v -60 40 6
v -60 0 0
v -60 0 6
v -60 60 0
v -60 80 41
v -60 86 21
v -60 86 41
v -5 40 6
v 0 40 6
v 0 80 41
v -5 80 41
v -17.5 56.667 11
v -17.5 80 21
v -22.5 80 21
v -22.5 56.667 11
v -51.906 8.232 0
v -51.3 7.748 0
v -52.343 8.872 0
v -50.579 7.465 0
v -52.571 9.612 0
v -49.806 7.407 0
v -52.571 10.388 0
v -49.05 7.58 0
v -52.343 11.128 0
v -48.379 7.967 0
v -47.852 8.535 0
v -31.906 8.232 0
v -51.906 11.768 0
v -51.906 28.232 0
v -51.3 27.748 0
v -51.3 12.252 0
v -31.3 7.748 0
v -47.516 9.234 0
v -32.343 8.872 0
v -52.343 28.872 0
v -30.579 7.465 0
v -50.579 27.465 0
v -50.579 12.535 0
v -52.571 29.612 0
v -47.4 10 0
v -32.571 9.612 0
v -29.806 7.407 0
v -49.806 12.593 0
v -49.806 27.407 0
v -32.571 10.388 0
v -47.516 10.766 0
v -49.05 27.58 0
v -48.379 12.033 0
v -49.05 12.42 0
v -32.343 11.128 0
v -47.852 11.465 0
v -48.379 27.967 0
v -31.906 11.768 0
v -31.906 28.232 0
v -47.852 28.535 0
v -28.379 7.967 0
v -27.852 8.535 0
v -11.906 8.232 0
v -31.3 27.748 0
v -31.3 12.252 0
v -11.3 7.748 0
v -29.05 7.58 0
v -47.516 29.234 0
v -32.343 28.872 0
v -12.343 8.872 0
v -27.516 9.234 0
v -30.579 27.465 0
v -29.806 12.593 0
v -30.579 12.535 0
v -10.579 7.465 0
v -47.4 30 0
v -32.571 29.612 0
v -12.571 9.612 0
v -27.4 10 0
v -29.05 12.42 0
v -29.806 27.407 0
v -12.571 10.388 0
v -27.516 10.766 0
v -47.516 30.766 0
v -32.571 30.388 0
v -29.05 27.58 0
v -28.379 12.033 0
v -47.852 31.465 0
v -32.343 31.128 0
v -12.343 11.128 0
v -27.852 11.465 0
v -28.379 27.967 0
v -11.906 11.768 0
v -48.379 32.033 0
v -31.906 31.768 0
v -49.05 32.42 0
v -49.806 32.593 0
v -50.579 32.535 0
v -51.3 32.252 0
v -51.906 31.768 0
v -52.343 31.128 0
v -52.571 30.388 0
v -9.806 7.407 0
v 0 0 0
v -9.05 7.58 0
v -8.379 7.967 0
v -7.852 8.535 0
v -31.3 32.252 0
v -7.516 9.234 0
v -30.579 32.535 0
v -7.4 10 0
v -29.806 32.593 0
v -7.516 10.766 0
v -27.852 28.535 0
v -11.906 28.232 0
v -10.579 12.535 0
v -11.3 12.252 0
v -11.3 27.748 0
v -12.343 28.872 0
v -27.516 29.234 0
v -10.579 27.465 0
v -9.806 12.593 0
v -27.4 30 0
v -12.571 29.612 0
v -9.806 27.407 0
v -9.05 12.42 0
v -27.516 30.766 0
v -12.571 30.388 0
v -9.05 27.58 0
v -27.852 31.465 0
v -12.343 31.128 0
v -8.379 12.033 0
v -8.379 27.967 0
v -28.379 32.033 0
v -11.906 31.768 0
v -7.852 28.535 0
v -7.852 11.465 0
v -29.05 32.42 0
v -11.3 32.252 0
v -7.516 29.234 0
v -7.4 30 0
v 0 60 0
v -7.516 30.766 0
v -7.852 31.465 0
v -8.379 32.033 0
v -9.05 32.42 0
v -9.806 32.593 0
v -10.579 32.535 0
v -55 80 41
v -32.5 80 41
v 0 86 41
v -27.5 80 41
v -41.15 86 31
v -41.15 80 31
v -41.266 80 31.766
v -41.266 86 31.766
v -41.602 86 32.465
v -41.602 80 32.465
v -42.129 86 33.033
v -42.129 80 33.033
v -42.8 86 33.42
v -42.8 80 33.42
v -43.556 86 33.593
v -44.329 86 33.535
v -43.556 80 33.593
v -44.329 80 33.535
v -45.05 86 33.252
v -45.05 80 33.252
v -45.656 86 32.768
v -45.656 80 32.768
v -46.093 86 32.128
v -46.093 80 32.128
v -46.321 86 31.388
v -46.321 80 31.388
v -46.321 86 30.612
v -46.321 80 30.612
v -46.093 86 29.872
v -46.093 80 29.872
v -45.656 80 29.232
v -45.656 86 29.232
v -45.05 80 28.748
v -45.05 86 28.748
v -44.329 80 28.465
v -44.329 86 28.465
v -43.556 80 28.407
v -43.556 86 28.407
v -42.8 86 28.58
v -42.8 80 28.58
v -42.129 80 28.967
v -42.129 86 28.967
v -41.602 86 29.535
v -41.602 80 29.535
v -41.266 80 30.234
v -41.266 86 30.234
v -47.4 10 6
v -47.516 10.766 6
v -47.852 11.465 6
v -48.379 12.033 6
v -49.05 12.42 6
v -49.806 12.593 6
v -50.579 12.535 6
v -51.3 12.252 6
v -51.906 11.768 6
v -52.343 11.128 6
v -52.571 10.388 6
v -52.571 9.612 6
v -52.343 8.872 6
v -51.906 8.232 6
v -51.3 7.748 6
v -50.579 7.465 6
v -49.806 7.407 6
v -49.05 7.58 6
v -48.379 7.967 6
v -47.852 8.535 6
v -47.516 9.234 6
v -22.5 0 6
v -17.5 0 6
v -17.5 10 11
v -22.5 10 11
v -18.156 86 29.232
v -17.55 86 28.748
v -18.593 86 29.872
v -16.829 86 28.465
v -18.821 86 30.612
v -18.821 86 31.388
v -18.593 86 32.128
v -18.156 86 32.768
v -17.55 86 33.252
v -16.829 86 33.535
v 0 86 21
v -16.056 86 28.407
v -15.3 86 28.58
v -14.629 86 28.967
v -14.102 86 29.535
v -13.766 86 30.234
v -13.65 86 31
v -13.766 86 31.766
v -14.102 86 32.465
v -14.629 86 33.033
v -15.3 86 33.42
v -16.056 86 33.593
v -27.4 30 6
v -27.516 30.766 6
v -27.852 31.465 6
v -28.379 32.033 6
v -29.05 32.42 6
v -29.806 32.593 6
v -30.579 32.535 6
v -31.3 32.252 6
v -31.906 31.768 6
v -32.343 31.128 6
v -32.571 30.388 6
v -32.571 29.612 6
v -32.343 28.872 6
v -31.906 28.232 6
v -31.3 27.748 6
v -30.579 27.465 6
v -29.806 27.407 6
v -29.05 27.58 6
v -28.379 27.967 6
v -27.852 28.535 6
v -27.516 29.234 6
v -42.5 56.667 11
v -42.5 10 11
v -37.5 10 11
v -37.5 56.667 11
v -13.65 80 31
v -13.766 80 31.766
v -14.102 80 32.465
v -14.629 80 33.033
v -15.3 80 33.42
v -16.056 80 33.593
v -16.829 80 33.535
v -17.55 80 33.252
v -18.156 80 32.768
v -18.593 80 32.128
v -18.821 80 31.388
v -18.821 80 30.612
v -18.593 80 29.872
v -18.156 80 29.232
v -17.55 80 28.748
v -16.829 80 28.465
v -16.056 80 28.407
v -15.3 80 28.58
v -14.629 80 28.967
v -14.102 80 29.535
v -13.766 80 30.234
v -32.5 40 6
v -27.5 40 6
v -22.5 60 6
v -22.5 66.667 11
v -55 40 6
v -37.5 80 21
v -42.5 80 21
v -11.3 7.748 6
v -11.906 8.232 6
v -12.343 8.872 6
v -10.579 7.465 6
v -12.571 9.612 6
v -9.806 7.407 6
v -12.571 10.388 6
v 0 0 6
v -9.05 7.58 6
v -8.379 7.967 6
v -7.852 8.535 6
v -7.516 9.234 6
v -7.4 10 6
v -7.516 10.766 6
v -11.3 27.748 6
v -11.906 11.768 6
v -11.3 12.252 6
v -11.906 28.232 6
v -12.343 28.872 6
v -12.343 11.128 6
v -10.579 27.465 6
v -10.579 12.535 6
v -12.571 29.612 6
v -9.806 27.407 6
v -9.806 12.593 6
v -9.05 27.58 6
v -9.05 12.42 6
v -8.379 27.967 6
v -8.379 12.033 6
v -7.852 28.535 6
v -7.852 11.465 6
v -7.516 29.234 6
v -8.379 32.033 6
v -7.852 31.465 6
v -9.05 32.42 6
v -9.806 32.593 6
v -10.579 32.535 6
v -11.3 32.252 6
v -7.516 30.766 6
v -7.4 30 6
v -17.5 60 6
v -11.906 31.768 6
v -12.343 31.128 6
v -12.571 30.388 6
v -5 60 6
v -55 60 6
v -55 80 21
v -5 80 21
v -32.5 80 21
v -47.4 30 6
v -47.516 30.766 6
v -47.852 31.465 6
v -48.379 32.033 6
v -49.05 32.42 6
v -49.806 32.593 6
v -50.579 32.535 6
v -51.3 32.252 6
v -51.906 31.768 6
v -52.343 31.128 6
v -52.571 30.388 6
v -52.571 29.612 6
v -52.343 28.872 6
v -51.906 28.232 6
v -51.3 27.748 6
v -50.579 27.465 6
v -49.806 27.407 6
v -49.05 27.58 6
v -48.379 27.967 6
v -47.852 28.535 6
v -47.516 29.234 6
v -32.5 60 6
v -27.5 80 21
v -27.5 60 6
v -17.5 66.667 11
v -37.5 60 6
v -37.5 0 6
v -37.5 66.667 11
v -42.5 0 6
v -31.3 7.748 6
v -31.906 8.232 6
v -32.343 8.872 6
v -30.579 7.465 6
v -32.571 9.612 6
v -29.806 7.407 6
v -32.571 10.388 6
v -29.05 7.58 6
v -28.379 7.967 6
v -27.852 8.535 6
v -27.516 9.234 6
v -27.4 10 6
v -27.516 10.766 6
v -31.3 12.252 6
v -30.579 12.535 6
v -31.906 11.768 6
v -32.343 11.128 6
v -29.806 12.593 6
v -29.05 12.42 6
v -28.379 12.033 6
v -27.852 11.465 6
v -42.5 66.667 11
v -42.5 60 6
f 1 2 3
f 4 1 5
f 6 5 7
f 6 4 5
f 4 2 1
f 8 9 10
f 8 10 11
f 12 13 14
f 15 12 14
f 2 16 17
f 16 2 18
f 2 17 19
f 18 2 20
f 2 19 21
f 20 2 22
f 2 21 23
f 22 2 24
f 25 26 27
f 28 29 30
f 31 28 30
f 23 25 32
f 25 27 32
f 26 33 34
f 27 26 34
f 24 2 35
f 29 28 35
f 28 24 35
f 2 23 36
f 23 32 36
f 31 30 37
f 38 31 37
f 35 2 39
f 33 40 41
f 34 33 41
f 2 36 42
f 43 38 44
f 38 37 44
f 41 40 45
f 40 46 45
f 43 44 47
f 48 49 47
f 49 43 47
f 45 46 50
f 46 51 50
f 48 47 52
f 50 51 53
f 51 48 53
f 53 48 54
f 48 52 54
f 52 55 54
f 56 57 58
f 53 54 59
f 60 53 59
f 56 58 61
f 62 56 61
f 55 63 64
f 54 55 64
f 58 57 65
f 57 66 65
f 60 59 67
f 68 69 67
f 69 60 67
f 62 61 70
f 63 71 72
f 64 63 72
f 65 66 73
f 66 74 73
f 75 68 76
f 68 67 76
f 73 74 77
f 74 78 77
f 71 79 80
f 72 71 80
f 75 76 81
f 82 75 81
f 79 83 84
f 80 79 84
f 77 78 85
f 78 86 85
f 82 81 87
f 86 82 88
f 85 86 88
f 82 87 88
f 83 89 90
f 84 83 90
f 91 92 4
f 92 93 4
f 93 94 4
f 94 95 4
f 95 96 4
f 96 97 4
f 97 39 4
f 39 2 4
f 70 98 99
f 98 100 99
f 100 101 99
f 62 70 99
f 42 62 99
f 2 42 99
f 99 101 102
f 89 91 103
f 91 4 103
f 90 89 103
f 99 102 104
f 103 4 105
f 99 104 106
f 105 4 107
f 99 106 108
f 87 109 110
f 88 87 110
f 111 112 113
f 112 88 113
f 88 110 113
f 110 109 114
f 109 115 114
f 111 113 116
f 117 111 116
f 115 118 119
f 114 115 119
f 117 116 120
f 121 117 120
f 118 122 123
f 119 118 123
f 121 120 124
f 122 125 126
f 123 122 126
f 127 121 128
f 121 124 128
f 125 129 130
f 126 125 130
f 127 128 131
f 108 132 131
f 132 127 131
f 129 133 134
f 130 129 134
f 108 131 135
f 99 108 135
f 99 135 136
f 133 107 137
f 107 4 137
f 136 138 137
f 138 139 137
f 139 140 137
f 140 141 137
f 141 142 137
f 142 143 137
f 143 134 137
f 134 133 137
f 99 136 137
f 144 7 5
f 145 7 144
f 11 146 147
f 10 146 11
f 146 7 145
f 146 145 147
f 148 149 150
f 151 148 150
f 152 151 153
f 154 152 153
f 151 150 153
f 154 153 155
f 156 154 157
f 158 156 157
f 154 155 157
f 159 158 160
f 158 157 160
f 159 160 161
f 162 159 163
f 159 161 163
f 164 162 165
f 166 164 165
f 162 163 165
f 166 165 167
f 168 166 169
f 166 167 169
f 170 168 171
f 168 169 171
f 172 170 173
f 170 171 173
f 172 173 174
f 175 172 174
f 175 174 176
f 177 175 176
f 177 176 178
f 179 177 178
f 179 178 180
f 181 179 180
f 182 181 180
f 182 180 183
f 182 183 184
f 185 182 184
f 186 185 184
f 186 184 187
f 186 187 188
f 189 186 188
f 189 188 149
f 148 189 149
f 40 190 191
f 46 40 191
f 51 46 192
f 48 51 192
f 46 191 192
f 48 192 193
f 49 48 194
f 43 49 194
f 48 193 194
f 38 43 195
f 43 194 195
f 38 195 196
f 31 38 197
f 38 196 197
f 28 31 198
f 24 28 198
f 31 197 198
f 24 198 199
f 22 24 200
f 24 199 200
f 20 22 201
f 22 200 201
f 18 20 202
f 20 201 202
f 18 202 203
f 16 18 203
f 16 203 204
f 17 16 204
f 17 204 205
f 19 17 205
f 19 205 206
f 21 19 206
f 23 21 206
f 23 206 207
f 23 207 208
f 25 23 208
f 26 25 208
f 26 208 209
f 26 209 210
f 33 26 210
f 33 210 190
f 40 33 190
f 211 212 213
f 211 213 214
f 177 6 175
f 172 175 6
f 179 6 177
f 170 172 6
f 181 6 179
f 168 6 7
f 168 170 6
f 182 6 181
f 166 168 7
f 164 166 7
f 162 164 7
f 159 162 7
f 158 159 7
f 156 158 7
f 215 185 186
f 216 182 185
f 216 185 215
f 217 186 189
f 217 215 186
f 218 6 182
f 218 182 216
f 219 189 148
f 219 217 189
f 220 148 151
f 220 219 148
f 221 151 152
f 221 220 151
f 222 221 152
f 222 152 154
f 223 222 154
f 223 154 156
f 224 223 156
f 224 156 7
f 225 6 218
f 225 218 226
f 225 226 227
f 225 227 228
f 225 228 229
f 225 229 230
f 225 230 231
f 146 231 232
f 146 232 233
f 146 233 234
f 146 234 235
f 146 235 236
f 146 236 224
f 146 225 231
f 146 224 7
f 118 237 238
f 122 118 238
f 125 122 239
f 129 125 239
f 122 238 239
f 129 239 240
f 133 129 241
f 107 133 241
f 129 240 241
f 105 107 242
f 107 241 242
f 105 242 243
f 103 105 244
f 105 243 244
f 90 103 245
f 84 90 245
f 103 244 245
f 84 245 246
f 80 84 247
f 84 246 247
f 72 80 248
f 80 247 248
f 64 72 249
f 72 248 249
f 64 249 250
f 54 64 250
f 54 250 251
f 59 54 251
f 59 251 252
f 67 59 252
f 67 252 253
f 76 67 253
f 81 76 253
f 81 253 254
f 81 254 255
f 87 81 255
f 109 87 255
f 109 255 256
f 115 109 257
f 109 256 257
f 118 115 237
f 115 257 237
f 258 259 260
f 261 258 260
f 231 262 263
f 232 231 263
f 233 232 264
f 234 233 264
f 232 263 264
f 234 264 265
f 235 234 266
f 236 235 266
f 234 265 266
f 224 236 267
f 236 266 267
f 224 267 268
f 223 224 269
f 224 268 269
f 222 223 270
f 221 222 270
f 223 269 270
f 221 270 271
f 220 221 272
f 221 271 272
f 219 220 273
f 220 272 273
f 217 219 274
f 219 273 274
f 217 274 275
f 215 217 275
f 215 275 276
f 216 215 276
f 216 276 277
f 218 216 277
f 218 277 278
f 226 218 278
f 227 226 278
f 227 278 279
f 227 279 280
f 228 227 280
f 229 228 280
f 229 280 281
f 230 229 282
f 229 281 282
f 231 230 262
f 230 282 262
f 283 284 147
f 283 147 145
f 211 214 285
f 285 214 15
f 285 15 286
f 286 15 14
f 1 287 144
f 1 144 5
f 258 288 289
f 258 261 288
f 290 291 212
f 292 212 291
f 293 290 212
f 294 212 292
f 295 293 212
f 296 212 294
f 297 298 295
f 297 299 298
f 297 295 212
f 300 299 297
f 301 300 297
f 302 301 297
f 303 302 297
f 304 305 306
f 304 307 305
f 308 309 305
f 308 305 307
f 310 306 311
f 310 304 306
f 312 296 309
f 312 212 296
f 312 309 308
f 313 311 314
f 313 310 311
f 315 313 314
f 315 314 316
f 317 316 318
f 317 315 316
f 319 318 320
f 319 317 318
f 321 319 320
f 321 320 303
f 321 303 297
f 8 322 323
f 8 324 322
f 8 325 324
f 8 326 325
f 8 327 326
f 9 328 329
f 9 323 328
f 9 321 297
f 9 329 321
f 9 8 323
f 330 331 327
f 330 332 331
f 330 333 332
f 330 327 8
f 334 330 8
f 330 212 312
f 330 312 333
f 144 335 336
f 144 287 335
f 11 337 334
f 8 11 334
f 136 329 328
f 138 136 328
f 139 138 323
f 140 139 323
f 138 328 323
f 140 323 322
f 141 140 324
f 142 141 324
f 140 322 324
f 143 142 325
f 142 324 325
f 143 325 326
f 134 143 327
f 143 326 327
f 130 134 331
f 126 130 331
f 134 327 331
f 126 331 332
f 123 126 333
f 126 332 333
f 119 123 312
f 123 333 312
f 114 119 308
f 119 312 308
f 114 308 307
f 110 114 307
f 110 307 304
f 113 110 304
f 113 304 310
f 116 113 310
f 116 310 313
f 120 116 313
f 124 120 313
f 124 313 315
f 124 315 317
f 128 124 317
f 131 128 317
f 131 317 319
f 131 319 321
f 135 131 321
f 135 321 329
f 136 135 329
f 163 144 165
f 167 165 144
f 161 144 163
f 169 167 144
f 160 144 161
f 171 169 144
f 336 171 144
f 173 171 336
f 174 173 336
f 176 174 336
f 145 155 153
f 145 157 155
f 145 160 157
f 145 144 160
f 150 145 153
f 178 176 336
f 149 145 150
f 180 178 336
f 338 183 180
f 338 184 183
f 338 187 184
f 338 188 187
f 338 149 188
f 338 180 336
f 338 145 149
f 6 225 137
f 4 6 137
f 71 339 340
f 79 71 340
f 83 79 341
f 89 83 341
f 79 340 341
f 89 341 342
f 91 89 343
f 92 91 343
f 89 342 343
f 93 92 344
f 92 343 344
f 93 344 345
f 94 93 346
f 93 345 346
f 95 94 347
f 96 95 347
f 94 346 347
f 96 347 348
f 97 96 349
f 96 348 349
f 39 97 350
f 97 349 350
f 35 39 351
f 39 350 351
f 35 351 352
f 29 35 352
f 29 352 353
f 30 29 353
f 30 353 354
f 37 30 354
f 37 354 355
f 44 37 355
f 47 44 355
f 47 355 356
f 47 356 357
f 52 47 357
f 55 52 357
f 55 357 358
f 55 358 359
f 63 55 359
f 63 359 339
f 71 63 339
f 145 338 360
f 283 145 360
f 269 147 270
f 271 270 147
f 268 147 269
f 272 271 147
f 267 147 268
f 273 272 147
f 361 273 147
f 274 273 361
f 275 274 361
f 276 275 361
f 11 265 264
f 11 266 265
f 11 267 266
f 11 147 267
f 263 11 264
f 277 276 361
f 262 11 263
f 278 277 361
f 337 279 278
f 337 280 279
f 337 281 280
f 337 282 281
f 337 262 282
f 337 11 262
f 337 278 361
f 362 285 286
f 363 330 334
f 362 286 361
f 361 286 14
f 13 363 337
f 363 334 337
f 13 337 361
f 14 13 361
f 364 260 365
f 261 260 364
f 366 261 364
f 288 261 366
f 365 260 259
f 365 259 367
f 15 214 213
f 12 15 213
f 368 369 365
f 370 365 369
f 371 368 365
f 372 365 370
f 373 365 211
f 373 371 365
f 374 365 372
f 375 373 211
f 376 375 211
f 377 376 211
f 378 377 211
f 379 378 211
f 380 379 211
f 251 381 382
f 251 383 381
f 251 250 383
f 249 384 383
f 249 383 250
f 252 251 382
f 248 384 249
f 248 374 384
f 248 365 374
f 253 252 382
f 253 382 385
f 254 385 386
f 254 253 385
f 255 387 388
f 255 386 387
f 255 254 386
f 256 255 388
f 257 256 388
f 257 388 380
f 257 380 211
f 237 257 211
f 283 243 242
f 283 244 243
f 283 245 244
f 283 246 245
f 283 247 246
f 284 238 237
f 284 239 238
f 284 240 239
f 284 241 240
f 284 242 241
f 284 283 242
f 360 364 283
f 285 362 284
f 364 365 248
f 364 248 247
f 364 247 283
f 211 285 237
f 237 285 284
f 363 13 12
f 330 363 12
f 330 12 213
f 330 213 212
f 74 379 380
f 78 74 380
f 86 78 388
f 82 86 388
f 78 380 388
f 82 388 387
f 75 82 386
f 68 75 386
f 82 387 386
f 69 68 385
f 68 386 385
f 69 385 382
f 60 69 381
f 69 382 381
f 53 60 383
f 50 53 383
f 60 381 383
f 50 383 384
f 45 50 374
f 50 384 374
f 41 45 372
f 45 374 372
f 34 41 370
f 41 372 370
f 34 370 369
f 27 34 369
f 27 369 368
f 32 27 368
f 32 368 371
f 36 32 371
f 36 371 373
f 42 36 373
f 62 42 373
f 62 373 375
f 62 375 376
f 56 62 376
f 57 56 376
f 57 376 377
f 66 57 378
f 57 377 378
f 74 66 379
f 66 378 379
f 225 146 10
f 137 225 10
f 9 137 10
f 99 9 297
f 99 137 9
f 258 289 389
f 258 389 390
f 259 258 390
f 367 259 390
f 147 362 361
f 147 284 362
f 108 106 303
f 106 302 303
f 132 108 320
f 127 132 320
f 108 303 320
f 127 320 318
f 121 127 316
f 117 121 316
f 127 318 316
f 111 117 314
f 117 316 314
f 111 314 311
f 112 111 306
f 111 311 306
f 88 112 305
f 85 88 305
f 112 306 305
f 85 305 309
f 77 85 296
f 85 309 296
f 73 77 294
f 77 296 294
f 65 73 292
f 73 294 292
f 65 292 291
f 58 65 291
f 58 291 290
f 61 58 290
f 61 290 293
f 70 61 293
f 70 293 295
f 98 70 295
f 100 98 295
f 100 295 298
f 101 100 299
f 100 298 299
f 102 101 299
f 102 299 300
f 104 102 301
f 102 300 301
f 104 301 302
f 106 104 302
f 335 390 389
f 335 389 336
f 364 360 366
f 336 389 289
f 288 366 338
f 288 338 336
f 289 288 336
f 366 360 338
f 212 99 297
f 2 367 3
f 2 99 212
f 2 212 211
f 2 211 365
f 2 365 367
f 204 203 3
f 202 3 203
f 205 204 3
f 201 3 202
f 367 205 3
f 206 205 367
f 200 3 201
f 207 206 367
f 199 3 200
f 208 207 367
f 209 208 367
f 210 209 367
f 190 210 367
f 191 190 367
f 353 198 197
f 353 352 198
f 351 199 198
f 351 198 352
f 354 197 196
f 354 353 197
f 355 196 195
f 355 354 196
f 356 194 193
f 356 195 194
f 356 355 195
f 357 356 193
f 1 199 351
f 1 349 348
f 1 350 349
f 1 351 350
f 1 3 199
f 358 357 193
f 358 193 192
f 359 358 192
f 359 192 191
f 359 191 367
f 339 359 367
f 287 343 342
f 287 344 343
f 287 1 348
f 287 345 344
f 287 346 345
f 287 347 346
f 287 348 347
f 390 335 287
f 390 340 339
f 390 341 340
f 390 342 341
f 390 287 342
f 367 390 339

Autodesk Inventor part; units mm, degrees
ref_plane "YZ Plane" through (0, 0, 0) normal (1, 0, 0) x (0, 1, 0)
ref_plane "XZ Plane" through (0, 0, 0) normal (0, 1, 0) x (-1, 0, 0)
sketch "Sketch1" plane through (0, 0, 0) normal (0, 0, 1) x (1, 0, 0)
  line L0 (0, 0) -> (-60, 0)
  line L1 (-60, 0) -> (-60, 60)
  line L2 (-60, 60) -> (0, 60)
  line L3 (0, 60) -> (0, 0)
  dimension "d0" = 60
  dimension "d1" = 60
extrude "Extrusion1" add sketch "Sketch1" along normal blind 6
sketch "Sketch2" plane through (0, 0, 6) normal (0, 0, 1) x (1, 0, 0)
  line L0 (0, 60) -> (-60, 60) projected
  line L1 (-60, 60) -> (-60, 0) projected
  line L2 (0, 60) -> (-60, 60)
  line L3 (-60, 60) -> (-60, 40)
  line L4 (-60, 40) -> (0, 40)
  line L5 (0, 40) -> (0, 60)
  line L6 (-60, 0) -> (0, 0) construction
  line L7 (-30, 0) -> (-30, 40) construction
  line L8 (-30, 20) -> (-30, 40) construction
  line L9 (-30, 20) -> (-30, 0) construction
  line L10 (-60, 30) -> (0, 30) construction
  line L11 (0, 0) -> (0, 60) construction
  line L12 (-60, 10) -> (0, 10) construction
  circle A0 centre (-50, 30) radius 2.6
  circle A1 centre (-30, 30) radius 2.6
  circle A2 centre (-10, 30) radius 2.6
  circle A3 centre (-50, 10) radius 2.6
  circle A4 centre (-30, 10) radius 2.6
  circle A5 centre (-10, 10) radius 2.6
  dimension "d4" = 20
  dimension "d5" = 5.2
  dimension "d6" = 5.2
  dimension "d7" = 5.2
  dimension "d8" = 5.2
  dimension "d9" = 5.2
  dimension "d10" = 5.2
  dimension "d11" = 20
  dimension "d12" = 20
  dimension "d13" = 20
  dimension "d14" = 20
  dimension "d15" = 20
extrude "Extrusion2" cut sketch "Sketch2" against normal up to next contours A0 | A1 | A2 | A3 | A4 | A5
sketch "Sketch3" plane through (0, 0, 0) normal (1, 0, 0) x (0, 0, -1)
  line L0 (0, 60) -> (0, 0) construction
  line L1 (0, 0) -> (0, 135.0487) construction
  line L2 (-21, 0) -> (-21, 135.0487) construction
  line L3 (-21, 86) -> (-41, 86)
  line L4 (-41, 86) -> (-41, 80)
  line L5 (-41, 80) -> (-21, 80)
  line L6 (-21, 80) -> (-21, 86)
  line L7 (0, 60) -> (-6, 60) projected
  line L8 (0, 60) -> (-6, 60) projected
  line L9 (-21, 86) -> (0, 60)
  line L10 (-6, 60) -> (-6, 0) projected
  line L11 (-6, 60) -> (-21, 80)
  dimension "d18" = 21
  dimension "d19" = 20
  dimension "d20" = 6
  dimension "d21" = 20
extrude "Extrusion3" add sketch "Sketch3" against normal up to surface (60 mm away)
sketch "Sketch4" plane through (0, 80, 41) normal (0, 0, 1) x (1, 0, 0)
  line L0 (0, 0) -> (-60, 0) projected
  line L1 (0, 0) -> (-5, 0)
  line L2 (-5, 0) -> (-5, -40)
  line L3 (-5, -40) -> (0, -40)
  line L4 (0, -40) -> (0, 0)
  circle A0 centre (-10, -50) radius 2.6 projected
  line L5 (-32.5, 0) -> (-32.5, -40)
  line L6 (-27.5, 0) -> (-32.5, 0)
  line L7 (-27.5, -40) -> (-27.5, 0)
  line L8 (-32.5, -40) -> (-27.5, -40)
  line L9 (-60, 0) -> (-60, -40)
  line L10 (-55, 0) -> (-60, 0)
  line L11 (-55, -40) -> (-55, 0)
  line L12 (-60, -40) -> (-55, -40)
  point P0 (0, -80)
  dimension "d24" = 5
  dimension "d25" = 10
  dimension "d28" = 27.5
extrude "Extrusion4" add sketch "Sketch4" against normal up to next contours L4 L3 L2 L0 | L11 L12 L9 L0 | L7 L8 L5 L0
chamfer "Chamfer1" distance 40 distance2 35 1 edges at (-2.5, 40, 41) measured on face at (-30.8333, 84, 41)
chamfer "Chamfer2" distance 40 distance2 35 1 edges at (-30, 40, 41) measured on face at (-30.8333, 84, 41)
chamfer "Chamfer3" distance 40 distance2 35 1 edges at (-57.5, 40, 41) measured on face at (-30.8333, 84, 41)
sketch "Sketch5" plane through (-55, 80, 21) normal (0, -1, 0) x (1, 0, 0)
  line L0 (-5, 0) -> (-5, 20) construction
  line L1 (-5, 10) -> (55, 10) construction
  line L2 (55, -15) -> (55, 20) construction
  circle A0 centre (11.25, 10) radius 2.6
  circle A1 centre (38.75, 10) radius 2.6
  line L3 (0, 20) -> (0, 0) projected
  line L4 (27.5, 20) -> (27.5, 0) projected
  point P0 (55, -21)
  dimension "d44" = 5.2
  dimension "d45" = 5.2
  dimension "d46" = 11.25
  dimension "d47" = 11.25
extrude "Extrusion5" cut sketch "Sketch5" against normal up to next
ref_plane "Work Plane1" through (0, 0, 11) normal (0, 0, 1) x (1, 0, 0)
sketch "Sketch7" plane through (0, 0, 11) normal (0, 0, 1) x (1, 0, 0)
  line L0 (-60, 0) -> (0, 0) projected
  line L1 (-17.5, 0) -> (-22.5, 0)
  line L2 (-22.5, 0) -> (-22.5, 70)
  line L3 (-22.5, 70) -> (-17.5, 70)
  line L4 (-17.5, 70) -> (-17.5, 0)
  circle A0 centre (-10, 30) radius 2.6 projected
  line L5 (-30, 0) -> (-30, 54.0913) construction
  line L6 (-42.5, 0) -> (-37.5, 0)
  line L7 (-37.5, 0) -> (-37.5, 70)
  line L8 (-37.5, 70) -> (-42.5, 70)
  line L9 (-42.5, 70) -> (-42.5, 0)
  dimension "d68" = 5
  dimension "d69" = 70
  dimension "d70" = 7.5
extrude "Extrusion7" add sketch "Sketch7" against normal up to next contours L9 L8 L7 L0 | L2 L3 L4 L0
chamfer "Chamfer8" distance 10 distance2 5 1 edges at (-20, 0, 11) measured on face at (-19.1667, 22.2222, 11)
chamfer "Chamfer9" distance 10 distance2 5 1 edges at (-40, 0, 11) measured on face at (-39.1667, 22.2222, 11)
chamfer "Chamfer10" distance 16.6667 distance2 10 1 edges at (-40, 66.6667, 11) measured on face at (-43.3333, 75.5556, 17.6667)
chamfer "Chamfer11" distance 16.6667 distance2 10 1 edges at (-20, 66.6667, 11) measured on face at (-16.6667, 75.5556, 17.6667)
equation "\"d6\" = d5"
equation "\"d7\" = d5"
equation "\"d8\" = d5"
equation "\"d9\" = d5"
equation "\"d10\" = d5"
equation "\"d47\" = d46"
properties part number "X Axis Drag Chain Support Mount"
